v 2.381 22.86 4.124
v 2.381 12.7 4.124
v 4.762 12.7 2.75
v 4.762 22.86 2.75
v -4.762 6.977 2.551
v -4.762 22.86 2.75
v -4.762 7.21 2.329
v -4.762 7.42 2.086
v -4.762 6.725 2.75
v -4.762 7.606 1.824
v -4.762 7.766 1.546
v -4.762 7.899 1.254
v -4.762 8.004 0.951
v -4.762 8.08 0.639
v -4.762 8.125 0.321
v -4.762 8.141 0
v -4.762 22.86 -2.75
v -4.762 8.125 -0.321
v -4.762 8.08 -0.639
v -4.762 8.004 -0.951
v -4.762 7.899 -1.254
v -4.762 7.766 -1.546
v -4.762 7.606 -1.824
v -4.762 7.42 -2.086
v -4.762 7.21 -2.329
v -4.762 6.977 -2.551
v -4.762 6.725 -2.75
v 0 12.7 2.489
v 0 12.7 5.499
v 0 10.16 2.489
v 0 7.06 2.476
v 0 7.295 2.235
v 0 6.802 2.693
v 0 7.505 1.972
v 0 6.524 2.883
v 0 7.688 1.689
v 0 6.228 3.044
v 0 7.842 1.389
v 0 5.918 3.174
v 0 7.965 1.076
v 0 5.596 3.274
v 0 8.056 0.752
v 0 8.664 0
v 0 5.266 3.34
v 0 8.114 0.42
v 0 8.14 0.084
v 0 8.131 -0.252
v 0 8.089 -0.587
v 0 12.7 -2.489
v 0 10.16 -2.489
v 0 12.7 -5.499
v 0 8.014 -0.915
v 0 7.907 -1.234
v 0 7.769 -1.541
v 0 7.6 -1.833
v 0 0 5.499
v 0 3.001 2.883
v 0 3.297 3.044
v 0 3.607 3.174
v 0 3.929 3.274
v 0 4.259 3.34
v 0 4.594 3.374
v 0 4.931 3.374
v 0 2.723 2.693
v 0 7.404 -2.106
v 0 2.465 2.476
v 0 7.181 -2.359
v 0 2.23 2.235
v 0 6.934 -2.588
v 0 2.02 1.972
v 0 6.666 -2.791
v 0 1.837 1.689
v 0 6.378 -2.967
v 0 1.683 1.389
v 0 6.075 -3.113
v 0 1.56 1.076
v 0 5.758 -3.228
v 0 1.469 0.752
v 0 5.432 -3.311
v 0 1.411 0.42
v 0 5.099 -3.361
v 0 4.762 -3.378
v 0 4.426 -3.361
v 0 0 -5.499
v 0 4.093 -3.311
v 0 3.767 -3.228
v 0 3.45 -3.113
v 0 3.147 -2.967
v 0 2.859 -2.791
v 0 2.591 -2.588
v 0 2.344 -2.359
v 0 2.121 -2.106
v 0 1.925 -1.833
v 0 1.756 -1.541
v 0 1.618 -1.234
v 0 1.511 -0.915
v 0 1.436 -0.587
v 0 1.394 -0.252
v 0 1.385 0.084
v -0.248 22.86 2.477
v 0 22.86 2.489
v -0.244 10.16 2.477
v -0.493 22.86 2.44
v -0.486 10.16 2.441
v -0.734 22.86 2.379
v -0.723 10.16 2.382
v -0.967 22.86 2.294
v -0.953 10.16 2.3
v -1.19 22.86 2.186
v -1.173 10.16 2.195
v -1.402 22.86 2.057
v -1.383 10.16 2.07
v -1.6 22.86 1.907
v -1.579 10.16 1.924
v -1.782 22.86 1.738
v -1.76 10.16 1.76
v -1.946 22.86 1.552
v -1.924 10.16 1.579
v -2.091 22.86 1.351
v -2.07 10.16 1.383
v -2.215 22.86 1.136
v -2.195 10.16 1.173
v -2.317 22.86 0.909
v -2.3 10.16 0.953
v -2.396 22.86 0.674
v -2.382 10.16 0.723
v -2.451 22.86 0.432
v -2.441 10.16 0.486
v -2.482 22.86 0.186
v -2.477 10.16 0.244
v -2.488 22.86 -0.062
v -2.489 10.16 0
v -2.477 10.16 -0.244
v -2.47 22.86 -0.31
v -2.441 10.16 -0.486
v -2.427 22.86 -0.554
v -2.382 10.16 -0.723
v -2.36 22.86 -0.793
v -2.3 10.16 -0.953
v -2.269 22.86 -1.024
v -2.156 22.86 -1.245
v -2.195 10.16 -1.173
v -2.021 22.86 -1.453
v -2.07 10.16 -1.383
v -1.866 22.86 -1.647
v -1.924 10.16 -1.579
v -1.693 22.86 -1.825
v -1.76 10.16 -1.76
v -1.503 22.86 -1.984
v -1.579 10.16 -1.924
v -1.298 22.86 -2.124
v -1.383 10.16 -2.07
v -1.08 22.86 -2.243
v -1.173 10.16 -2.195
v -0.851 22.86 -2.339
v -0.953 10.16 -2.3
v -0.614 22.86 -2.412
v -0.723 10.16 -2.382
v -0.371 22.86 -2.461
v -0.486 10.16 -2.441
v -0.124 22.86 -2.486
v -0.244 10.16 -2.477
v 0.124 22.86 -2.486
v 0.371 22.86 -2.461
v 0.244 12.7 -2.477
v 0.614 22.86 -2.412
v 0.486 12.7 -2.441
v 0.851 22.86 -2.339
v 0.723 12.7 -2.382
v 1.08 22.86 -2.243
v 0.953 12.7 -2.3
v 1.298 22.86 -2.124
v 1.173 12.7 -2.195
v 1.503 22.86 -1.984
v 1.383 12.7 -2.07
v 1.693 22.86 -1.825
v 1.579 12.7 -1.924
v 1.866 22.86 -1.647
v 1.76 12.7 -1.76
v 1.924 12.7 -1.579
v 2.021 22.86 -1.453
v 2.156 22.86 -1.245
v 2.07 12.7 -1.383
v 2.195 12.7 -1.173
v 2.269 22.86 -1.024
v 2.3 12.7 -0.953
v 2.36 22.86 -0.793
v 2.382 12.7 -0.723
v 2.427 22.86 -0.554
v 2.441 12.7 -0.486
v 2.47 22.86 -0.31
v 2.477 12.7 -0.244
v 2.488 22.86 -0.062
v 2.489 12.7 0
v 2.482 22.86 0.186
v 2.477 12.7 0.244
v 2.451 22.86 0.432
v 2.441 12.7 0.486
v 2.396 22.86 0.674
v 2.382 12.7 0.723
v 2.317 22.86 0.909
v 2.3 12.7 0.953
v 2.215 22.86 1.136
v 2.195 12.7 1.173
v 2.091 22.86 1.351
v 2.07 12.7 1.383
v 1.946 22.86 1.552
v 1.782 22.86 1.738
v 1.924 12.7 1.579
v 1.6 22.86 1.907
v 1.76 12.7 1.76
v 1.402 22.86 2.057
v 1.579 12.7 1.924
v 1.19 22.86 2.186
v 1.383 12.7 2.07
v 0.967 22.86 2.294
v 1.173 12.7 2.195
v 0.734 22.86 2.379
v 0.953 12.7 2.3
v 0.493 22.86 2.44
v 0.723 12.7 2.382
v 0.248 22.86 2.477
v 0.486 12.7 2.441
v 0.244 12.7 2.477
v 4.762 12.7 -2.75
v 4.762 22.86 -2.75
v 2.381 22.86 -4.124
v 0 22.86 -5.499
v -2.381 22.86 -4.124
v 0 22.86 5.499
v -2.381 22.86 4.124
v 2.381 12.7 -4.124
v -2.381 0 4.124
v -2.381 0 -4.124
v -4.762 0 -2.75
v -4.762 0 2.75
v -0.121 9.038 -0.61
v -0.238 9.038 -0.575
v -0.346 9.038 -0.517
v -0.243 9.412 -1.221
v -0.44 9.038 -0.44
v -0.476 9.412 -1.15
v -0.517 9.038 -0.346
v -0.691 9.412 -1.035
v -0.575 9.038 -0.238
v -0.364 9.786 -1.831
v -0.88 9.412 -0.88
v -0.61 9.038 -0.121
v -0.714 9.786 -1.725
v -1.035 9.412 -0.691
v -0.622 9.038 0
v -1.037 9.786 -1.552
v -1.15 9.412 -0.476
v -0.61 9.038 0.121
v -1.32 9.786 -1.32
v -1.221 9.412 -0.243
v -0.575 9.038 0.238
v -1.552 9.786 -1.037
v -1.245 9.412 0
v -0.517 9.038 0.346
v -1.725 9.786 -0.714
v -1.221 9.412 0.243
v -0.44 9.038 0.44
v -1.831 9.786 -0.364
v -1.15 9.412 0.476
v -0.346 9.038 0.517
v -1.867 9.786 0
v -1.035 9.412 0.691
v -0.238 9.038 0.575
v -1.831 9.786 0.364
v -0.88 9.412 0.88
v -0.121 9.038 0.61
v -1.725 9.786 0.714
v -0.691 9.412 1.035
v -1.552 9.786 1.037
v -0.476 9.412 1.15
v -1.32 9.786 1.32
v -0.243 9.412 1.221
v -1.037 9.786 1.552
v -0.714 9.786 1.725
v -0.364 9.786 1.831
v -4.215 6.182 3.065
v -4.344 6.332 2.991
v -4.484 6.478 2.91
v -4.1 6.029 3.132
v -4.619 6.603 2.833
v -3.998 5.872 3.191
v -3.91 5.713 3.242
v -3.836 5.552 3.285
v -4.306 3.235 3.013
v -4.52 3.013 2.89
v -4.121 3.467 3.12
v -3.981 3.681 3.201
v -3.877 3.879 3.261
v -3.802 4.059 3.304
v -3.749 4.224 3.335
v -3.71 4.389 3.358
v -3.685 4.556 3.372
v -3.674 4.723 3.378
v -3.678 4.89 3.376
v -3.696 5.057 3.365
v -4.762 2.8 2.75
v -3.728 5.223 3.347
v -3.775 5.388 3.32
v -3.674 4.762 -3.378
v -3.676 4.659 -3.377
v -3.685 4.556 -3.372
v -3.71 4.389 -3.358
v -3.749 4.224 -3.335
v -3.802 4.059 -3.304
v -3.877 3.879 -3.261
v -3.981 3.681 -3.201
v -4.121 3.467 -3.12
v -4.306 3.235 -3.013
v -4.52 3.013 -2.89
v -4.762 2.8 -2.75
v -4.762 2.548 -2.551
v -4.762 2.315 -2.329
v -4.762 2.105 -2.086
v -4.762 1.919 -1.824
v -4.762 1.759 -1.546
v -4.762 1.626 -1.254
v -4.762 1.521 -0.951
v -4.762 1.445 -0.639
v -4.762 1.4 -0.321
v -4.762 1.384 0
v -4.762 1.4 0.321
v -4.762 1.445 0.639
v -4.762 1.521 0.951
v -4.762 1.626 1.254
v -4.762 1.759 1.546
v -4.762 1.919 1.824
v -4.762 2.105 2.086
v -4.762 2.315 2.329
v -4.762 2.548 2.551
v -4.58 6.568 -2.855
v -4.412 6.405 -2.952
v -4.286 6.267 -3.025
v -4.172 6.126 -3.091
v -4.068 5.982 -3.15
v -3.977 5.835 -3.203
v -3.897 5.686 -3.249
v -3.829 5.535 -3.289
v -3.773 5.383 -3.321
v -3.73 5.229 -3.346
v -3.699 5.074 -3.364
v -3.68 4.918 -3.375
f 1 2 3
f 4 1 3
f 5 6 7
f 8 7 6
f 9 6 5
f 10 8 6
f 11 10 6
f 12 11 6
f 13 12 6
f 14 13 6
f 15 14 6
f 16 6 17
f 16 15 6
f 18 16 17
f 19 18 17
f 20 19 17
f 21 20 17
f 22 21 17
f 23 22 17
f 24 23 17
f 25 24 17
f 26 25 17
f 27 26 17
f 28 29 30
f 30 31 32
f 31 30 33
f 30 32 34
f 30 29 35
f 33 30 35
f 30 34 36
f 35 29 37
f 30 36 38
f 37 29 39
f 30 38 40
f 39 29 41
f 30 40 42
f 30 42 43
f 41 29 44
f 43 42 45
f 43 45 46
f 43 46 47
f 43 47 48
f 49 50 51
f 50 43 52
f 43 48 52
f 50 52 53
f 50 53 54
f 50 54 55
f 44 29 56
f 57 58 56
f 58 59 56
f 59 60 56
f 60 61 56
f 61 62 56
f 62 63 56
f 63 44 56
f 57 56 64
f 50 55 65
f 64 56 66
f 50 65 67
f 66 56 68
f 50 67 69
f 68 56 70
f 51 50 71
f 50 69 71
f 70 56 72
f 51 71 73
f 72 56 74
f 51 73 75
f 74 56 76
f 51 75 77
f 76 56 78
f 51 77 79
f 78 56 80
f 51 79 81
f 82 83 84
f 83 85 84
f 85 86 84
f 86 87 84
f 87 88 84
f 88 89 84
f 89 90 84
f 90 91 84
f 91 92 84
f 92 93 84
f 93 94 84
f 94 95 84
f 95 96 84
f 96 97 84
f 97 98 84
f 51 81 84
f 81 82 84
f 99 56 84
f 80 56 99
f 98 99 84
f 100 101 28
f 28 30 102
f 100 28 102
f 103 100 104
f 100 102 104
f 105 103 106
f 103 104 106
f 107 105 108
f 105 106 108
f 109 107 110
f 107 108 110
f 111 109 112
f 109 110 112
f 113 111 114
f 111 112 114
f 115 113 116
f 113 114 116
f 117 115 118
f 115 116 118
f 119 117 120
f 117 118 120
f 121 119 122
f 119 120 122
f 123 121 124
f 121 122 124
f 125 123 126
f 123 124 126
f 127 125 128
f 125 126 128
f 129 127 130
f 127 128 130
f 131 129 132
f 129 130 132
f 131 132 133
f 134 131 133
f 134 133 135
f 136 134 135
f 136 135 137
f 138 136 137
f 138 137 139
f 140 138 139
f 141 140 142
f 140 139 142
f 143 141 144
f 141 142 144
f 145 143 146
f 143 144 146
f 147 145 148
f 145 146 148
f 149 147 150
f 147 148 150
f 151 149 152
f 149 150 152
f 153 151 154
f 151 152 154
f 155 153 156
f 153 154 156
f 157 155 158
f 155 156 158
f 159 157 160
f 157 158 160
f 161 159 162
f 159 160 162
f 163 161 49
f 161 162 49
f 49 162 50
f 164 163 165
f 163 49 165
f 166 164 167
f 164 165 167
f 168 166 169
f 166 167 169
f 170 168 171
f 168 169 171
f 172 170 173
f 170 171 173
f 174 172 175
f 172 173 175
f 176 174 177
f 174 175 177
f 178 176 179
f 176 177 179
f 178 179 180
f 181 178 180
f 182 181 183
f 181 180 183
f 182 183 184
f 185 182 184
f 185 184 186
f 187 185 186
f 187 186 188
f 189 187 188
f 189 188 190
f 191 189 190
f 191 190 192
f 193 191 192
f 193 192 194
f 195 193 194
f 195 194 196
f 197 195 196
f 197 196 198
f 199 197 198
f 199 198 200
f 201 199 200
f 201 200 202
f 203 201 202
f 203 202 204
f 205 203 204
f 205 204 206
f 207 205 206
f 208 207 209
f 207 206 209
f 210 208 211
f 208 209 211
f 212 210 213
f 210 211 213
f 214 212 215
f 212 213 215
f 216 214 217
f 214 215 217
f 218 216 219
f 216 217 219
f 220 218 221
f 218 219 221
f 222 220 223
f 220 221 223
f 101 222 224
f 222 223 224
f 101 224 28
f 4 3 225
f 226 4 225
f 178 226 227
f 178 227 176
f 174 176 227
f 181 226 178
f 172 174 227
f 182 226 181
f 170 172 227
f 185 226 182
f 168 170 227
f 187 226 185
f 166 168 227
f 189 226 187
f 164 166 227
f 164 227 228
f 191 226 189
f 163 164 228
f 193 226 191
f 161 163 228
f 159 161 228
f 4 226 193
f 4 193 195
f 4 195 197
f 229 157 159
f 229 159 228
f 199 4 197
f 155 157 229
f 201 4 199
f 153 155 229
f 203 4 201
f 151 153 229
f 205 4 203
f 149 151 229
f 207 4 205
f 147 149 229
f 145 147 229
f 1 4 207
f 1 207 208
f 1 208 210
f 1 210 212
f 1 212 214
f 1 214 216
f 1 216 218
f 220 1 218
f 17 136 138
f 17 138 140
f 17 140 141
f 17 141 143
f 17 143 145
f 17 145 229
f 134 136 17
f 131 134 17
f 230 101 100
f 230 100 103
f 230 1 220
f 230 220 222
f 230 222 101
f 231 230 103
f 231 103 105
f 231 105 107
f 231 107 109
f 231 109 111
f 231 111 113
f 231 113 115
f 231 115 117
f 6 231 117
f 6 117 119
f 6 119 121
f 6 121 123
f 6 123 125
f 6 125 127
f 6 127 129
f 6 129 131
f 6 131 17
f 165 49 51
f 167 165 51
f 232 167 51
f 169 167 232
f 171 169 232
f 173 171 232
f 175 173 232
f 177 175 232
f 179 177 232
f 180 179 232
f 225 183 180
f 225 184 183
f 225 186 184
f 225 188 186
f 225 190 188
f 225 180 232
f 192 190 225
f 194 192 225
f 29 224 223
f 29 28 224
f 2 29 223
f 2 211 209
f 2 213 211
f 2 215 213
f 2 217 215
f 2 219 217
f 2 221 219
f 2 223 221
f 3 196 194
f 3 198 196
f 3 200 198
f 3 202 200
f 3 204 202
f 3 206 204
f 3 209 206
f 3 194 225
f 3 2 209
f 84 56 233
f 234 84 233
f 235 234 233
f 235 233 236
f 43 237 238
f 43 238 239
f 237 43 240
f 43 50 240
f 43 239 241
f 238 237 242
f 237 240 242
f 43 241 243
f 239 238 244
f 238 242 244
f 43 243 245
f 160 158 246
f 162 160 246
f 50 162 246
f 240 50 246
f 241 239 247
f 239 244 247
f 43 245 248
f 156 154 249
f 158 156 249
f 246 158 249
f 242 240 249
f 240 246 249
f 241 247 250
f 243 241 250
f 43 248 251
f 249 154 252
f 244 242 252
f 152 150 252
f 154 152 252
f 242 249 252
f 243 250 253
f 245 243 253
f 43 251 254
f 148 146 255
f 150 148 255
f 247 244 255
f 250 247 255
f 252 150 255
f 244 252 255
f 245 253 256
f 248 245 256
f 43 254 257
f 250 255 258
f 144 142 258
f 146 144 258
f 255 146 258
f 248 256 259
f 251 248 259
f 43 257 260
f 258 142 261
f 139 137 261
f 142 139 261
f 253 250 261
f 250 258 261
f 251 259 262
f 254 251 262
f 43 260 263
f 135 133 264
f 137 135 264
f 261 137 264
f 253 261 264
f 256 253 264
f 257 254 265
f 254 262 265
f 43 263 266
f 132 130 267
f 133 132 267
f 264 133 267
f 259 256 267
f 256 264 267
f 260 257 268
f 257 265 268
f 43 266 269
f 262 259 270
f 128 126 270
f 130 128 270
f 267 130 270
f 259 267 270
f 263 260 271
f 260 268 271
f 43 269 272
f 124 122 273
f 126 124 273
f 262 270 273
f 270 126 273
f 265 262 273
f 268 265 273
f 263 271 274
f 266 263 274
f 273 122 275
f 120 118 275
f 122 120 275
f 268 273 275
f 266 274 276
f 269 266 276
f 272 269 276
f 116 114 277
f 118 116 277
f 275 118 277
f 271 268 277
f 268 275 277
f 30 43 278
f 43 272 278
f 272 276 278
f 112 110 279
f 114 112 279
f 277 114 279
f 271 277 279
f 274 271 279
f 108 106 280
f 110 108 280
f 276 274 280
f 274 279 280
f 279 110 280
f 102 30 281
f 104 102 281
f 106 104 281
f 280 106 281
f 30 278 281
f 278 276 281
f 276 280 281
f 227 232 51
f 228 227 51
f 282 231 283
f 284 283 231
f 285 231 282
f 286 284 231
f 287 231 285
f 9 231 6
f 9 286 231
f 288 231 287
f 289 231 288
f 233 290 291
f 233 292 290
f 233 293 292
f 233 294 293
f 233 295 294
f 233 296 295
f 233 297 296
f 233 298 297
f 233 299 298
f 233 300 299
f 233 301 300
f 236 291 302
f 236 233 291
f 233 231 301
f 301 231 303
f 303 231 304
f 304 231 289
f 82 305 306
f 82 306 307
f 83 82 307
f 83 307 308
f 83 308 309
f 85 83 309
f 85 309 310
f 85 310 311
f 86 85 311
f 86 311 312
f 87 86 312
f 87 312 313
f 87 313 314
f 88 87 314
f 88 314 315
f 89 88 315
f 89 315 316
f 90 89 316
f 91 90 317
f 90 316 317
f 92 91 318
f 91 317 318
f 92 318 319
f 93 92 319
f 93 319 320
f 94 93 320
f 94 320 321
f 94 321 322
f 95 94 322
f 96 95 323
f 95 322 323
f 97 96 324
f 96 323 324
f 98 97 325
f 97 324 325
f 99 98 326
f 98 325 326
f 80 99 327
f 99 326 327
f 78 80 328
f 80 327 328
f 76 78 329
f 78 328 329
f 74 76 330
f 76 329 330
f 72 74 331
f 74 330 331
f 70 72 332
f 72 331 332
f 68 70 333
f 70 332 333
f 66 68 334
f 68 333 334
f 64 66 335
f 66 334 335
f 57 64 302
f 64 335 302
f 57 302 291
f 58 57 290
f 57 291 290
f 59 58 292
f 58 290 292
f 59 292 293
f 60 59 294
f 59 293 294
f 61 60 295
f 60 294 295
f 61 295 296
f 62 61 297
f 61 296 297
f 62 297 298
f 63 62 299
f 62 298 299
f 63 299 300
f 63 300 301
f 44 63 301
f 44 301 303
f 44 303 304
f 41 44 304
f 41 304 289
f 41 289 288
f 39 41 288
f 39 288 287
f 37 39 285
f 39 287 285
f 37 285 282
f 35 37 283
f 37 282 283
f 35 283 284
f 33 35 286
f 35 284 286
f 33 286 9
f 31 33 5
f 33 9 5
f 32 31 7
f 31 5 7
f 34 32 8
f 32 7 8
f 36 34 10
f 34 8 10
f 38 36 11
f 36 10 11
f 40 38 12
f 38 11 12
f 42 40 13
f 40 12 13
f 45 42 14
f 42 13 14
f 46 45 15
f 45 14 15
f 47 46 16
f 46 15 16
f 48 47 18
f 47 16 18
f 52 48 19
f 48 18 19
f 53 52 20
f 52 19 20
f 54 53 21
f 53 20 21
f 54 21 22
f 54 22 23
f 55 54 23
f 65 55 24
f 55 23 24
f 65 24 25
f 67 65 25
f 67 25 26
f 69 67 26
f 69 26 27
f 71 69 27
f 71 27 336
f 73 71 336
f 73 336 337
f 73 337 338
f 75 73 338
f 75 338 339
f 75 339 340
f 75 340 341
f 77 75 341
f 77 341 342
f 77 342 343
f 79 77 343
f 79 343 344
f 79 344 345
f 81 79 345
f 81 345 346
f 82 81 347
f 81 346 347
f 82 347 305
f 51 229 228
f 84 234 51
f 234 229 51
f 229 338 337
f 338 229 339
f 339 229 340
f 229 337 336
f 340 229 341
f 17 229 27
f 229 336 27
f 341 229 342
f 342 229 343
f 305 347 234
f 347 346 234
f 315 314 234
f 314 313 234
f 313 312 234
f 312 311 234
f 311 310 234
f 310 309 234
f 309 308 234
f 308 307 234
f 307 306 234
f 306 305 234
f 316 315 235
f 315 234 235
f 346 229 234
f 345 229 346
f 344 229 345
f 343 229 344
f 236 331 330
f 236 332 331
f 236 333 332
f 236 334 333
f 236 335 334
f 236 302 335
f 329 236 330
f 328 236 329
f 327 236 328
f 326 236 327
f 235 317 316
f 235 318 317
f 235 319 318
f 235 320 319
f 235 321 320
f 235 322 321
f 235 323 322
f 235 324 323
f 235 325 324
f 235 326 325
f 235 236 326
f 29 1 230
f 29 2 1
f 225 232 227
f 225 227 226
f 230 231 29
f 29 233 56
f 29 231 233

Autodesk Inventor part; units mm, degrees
ref_plane "YZ Plane" through (0, 0, 0) normal (1, 0, 0) x (0, 1, 0)
ref_plane "XZ Plane" through (0, 0, 0) normal (0, 1, 0) x (-1, 0, 0)
ref_plane "XY Plane" through (0, 0, 0) normal (0, 0, 1) x (1, 0, 0)
sketch "Sketch1" plane through (0, 0, 0) normal (0, 1, 0) x (-1, 0, 0)
  line L0 (0, 0) -> (4.7625, 0)
  line L1 (4.7625, 0) -> (4.7625, -2.7496)
  line L2 (4.7625, 0) -> (7.5121, 0) construction
  line L3 (4.7625, 0) -> (4.7625, 2.7496)
  line L4 (2.3813, 4.1244) -> (0, 5.4993)
  line L5 (2.3813, 4.1244) -> (4.7625, 2.7496)
  line L6 (-2.3813, 4.1244) -> (-4.7625, 2.7496)
  line L7 (-2.3813, 4.1244) -> (0, 5.4993)
  line L8 (-4.7625, 0) -> (-4.7625, -2.7496)
  line L9 (-4.7625, 0) -> (-4.7625, 2.7496)
  line L10 (-2.3812, -4.1244) -> (0, -5.4993)
  line L11 (-2.3812, -4.1244) -> (-4.7625, -2.7496)
  line L12 (2.3813, -4.1244) -> (4.7625, -2.7496)
  line L13 (2.3813, -4.1244) -> (0, -5.4993)
  line L14 (4.7625, 2.7496) -> (4.7625, -2.7496)
  line L15 (4.7625, -2.7496) -> (0, -5.4993)
  line L16 (0, -5.4993) -> (-4.7625, -2.7496)
  line L17 (-4.7625, -2.7496) -> (-4.7625, 2.7496)
  line L18 (-4.7625, 2.7496) -> (0, 5.4993)
  line L19 (4.7625, 2.7496) -> (0, 5.4993)
  dimension "d0" = 4.7625
  dimension "d1" = 90
  dimension "d4" = 360
extrude "Extrusion1" add sketch "Sketch1" along normal blind 22.86
sketch "Sketch2" plane through (0, 22.86, 0) normal (0, 1, 0) x (1, 0, 0)
  point P0 (0, 0)
  point P1 (0, 0)
hole "Hole1" at (0, 22.86, 0) direction (0, -1, 0) diameter 4.9784 depth 12.7 tip angle 118 thread size "1/4-20 UNC" class "2B" standard "ANSI Unified Screw Threads"
sketch "Sketch3" plane through (0, 0, 0) normal (0, -1, 0) x (1, 0, 0)
  line L0 (0, 0) -> (9.2843, 0)
  line L1 (9.2843, 0) -> (9.2843, -7.4131)
  line L2 (9.2843, -7.4131) -> (0, -7.4131)
  line L3 (0, -7.4131) -> (0, 0)
  line L4 (9.2843, 0) -> (9.2843, 7.4131)
  line L5 (9.2843, 7.4131) -> (0, 7.4131)
  line L6 (0, 7.4131) -> (0, 0)
extrude "Extrusion2" cut sketch "Sketch3" against normal blind 12.7
sketch "Sketch5" plane through (0, 0, 5.4993) normal (1, 0, 0) x (0, 0, -1)
  line L0 (10.9985, 0) -> (10.9985, 12.7) projected
  line L1 (0, 0) -> (0, 12.7) projected
  line L2 (5.4993, 0) -> (5.4993, 4.7625)
  circle A0 centre (5.4993, 4.7625) radius 3.3782
  dimension "d17" = 4.7625
  dimension "d18" = 6.7564
hole "Hole2" at (0, 4.7625, 0) direction (-1, 0, 0) diameter 6.7564 end through all clearance for "Flat Head Machine Screw (82)" size "1/4" standard "Ansi Unified Screw Threads"
sketch "Sketch7" plane through (0, 0, 5.4993) normal (1, 0, 0) x (0, 0, -1)
  arc A0 (2.7496, 2.7999) -> (8.2489, 2.7999) centre (5.4993, 4.7625) ccw projected
  line L0 (10.9985, 0) -> (10.9985, 12.7) projected
  circle A1 centre (5.4993, 4.7625) radius 7.2748
  point P0 (5.4993, 0)
properties part number "feet type 3 part 1 hexagon stock"
